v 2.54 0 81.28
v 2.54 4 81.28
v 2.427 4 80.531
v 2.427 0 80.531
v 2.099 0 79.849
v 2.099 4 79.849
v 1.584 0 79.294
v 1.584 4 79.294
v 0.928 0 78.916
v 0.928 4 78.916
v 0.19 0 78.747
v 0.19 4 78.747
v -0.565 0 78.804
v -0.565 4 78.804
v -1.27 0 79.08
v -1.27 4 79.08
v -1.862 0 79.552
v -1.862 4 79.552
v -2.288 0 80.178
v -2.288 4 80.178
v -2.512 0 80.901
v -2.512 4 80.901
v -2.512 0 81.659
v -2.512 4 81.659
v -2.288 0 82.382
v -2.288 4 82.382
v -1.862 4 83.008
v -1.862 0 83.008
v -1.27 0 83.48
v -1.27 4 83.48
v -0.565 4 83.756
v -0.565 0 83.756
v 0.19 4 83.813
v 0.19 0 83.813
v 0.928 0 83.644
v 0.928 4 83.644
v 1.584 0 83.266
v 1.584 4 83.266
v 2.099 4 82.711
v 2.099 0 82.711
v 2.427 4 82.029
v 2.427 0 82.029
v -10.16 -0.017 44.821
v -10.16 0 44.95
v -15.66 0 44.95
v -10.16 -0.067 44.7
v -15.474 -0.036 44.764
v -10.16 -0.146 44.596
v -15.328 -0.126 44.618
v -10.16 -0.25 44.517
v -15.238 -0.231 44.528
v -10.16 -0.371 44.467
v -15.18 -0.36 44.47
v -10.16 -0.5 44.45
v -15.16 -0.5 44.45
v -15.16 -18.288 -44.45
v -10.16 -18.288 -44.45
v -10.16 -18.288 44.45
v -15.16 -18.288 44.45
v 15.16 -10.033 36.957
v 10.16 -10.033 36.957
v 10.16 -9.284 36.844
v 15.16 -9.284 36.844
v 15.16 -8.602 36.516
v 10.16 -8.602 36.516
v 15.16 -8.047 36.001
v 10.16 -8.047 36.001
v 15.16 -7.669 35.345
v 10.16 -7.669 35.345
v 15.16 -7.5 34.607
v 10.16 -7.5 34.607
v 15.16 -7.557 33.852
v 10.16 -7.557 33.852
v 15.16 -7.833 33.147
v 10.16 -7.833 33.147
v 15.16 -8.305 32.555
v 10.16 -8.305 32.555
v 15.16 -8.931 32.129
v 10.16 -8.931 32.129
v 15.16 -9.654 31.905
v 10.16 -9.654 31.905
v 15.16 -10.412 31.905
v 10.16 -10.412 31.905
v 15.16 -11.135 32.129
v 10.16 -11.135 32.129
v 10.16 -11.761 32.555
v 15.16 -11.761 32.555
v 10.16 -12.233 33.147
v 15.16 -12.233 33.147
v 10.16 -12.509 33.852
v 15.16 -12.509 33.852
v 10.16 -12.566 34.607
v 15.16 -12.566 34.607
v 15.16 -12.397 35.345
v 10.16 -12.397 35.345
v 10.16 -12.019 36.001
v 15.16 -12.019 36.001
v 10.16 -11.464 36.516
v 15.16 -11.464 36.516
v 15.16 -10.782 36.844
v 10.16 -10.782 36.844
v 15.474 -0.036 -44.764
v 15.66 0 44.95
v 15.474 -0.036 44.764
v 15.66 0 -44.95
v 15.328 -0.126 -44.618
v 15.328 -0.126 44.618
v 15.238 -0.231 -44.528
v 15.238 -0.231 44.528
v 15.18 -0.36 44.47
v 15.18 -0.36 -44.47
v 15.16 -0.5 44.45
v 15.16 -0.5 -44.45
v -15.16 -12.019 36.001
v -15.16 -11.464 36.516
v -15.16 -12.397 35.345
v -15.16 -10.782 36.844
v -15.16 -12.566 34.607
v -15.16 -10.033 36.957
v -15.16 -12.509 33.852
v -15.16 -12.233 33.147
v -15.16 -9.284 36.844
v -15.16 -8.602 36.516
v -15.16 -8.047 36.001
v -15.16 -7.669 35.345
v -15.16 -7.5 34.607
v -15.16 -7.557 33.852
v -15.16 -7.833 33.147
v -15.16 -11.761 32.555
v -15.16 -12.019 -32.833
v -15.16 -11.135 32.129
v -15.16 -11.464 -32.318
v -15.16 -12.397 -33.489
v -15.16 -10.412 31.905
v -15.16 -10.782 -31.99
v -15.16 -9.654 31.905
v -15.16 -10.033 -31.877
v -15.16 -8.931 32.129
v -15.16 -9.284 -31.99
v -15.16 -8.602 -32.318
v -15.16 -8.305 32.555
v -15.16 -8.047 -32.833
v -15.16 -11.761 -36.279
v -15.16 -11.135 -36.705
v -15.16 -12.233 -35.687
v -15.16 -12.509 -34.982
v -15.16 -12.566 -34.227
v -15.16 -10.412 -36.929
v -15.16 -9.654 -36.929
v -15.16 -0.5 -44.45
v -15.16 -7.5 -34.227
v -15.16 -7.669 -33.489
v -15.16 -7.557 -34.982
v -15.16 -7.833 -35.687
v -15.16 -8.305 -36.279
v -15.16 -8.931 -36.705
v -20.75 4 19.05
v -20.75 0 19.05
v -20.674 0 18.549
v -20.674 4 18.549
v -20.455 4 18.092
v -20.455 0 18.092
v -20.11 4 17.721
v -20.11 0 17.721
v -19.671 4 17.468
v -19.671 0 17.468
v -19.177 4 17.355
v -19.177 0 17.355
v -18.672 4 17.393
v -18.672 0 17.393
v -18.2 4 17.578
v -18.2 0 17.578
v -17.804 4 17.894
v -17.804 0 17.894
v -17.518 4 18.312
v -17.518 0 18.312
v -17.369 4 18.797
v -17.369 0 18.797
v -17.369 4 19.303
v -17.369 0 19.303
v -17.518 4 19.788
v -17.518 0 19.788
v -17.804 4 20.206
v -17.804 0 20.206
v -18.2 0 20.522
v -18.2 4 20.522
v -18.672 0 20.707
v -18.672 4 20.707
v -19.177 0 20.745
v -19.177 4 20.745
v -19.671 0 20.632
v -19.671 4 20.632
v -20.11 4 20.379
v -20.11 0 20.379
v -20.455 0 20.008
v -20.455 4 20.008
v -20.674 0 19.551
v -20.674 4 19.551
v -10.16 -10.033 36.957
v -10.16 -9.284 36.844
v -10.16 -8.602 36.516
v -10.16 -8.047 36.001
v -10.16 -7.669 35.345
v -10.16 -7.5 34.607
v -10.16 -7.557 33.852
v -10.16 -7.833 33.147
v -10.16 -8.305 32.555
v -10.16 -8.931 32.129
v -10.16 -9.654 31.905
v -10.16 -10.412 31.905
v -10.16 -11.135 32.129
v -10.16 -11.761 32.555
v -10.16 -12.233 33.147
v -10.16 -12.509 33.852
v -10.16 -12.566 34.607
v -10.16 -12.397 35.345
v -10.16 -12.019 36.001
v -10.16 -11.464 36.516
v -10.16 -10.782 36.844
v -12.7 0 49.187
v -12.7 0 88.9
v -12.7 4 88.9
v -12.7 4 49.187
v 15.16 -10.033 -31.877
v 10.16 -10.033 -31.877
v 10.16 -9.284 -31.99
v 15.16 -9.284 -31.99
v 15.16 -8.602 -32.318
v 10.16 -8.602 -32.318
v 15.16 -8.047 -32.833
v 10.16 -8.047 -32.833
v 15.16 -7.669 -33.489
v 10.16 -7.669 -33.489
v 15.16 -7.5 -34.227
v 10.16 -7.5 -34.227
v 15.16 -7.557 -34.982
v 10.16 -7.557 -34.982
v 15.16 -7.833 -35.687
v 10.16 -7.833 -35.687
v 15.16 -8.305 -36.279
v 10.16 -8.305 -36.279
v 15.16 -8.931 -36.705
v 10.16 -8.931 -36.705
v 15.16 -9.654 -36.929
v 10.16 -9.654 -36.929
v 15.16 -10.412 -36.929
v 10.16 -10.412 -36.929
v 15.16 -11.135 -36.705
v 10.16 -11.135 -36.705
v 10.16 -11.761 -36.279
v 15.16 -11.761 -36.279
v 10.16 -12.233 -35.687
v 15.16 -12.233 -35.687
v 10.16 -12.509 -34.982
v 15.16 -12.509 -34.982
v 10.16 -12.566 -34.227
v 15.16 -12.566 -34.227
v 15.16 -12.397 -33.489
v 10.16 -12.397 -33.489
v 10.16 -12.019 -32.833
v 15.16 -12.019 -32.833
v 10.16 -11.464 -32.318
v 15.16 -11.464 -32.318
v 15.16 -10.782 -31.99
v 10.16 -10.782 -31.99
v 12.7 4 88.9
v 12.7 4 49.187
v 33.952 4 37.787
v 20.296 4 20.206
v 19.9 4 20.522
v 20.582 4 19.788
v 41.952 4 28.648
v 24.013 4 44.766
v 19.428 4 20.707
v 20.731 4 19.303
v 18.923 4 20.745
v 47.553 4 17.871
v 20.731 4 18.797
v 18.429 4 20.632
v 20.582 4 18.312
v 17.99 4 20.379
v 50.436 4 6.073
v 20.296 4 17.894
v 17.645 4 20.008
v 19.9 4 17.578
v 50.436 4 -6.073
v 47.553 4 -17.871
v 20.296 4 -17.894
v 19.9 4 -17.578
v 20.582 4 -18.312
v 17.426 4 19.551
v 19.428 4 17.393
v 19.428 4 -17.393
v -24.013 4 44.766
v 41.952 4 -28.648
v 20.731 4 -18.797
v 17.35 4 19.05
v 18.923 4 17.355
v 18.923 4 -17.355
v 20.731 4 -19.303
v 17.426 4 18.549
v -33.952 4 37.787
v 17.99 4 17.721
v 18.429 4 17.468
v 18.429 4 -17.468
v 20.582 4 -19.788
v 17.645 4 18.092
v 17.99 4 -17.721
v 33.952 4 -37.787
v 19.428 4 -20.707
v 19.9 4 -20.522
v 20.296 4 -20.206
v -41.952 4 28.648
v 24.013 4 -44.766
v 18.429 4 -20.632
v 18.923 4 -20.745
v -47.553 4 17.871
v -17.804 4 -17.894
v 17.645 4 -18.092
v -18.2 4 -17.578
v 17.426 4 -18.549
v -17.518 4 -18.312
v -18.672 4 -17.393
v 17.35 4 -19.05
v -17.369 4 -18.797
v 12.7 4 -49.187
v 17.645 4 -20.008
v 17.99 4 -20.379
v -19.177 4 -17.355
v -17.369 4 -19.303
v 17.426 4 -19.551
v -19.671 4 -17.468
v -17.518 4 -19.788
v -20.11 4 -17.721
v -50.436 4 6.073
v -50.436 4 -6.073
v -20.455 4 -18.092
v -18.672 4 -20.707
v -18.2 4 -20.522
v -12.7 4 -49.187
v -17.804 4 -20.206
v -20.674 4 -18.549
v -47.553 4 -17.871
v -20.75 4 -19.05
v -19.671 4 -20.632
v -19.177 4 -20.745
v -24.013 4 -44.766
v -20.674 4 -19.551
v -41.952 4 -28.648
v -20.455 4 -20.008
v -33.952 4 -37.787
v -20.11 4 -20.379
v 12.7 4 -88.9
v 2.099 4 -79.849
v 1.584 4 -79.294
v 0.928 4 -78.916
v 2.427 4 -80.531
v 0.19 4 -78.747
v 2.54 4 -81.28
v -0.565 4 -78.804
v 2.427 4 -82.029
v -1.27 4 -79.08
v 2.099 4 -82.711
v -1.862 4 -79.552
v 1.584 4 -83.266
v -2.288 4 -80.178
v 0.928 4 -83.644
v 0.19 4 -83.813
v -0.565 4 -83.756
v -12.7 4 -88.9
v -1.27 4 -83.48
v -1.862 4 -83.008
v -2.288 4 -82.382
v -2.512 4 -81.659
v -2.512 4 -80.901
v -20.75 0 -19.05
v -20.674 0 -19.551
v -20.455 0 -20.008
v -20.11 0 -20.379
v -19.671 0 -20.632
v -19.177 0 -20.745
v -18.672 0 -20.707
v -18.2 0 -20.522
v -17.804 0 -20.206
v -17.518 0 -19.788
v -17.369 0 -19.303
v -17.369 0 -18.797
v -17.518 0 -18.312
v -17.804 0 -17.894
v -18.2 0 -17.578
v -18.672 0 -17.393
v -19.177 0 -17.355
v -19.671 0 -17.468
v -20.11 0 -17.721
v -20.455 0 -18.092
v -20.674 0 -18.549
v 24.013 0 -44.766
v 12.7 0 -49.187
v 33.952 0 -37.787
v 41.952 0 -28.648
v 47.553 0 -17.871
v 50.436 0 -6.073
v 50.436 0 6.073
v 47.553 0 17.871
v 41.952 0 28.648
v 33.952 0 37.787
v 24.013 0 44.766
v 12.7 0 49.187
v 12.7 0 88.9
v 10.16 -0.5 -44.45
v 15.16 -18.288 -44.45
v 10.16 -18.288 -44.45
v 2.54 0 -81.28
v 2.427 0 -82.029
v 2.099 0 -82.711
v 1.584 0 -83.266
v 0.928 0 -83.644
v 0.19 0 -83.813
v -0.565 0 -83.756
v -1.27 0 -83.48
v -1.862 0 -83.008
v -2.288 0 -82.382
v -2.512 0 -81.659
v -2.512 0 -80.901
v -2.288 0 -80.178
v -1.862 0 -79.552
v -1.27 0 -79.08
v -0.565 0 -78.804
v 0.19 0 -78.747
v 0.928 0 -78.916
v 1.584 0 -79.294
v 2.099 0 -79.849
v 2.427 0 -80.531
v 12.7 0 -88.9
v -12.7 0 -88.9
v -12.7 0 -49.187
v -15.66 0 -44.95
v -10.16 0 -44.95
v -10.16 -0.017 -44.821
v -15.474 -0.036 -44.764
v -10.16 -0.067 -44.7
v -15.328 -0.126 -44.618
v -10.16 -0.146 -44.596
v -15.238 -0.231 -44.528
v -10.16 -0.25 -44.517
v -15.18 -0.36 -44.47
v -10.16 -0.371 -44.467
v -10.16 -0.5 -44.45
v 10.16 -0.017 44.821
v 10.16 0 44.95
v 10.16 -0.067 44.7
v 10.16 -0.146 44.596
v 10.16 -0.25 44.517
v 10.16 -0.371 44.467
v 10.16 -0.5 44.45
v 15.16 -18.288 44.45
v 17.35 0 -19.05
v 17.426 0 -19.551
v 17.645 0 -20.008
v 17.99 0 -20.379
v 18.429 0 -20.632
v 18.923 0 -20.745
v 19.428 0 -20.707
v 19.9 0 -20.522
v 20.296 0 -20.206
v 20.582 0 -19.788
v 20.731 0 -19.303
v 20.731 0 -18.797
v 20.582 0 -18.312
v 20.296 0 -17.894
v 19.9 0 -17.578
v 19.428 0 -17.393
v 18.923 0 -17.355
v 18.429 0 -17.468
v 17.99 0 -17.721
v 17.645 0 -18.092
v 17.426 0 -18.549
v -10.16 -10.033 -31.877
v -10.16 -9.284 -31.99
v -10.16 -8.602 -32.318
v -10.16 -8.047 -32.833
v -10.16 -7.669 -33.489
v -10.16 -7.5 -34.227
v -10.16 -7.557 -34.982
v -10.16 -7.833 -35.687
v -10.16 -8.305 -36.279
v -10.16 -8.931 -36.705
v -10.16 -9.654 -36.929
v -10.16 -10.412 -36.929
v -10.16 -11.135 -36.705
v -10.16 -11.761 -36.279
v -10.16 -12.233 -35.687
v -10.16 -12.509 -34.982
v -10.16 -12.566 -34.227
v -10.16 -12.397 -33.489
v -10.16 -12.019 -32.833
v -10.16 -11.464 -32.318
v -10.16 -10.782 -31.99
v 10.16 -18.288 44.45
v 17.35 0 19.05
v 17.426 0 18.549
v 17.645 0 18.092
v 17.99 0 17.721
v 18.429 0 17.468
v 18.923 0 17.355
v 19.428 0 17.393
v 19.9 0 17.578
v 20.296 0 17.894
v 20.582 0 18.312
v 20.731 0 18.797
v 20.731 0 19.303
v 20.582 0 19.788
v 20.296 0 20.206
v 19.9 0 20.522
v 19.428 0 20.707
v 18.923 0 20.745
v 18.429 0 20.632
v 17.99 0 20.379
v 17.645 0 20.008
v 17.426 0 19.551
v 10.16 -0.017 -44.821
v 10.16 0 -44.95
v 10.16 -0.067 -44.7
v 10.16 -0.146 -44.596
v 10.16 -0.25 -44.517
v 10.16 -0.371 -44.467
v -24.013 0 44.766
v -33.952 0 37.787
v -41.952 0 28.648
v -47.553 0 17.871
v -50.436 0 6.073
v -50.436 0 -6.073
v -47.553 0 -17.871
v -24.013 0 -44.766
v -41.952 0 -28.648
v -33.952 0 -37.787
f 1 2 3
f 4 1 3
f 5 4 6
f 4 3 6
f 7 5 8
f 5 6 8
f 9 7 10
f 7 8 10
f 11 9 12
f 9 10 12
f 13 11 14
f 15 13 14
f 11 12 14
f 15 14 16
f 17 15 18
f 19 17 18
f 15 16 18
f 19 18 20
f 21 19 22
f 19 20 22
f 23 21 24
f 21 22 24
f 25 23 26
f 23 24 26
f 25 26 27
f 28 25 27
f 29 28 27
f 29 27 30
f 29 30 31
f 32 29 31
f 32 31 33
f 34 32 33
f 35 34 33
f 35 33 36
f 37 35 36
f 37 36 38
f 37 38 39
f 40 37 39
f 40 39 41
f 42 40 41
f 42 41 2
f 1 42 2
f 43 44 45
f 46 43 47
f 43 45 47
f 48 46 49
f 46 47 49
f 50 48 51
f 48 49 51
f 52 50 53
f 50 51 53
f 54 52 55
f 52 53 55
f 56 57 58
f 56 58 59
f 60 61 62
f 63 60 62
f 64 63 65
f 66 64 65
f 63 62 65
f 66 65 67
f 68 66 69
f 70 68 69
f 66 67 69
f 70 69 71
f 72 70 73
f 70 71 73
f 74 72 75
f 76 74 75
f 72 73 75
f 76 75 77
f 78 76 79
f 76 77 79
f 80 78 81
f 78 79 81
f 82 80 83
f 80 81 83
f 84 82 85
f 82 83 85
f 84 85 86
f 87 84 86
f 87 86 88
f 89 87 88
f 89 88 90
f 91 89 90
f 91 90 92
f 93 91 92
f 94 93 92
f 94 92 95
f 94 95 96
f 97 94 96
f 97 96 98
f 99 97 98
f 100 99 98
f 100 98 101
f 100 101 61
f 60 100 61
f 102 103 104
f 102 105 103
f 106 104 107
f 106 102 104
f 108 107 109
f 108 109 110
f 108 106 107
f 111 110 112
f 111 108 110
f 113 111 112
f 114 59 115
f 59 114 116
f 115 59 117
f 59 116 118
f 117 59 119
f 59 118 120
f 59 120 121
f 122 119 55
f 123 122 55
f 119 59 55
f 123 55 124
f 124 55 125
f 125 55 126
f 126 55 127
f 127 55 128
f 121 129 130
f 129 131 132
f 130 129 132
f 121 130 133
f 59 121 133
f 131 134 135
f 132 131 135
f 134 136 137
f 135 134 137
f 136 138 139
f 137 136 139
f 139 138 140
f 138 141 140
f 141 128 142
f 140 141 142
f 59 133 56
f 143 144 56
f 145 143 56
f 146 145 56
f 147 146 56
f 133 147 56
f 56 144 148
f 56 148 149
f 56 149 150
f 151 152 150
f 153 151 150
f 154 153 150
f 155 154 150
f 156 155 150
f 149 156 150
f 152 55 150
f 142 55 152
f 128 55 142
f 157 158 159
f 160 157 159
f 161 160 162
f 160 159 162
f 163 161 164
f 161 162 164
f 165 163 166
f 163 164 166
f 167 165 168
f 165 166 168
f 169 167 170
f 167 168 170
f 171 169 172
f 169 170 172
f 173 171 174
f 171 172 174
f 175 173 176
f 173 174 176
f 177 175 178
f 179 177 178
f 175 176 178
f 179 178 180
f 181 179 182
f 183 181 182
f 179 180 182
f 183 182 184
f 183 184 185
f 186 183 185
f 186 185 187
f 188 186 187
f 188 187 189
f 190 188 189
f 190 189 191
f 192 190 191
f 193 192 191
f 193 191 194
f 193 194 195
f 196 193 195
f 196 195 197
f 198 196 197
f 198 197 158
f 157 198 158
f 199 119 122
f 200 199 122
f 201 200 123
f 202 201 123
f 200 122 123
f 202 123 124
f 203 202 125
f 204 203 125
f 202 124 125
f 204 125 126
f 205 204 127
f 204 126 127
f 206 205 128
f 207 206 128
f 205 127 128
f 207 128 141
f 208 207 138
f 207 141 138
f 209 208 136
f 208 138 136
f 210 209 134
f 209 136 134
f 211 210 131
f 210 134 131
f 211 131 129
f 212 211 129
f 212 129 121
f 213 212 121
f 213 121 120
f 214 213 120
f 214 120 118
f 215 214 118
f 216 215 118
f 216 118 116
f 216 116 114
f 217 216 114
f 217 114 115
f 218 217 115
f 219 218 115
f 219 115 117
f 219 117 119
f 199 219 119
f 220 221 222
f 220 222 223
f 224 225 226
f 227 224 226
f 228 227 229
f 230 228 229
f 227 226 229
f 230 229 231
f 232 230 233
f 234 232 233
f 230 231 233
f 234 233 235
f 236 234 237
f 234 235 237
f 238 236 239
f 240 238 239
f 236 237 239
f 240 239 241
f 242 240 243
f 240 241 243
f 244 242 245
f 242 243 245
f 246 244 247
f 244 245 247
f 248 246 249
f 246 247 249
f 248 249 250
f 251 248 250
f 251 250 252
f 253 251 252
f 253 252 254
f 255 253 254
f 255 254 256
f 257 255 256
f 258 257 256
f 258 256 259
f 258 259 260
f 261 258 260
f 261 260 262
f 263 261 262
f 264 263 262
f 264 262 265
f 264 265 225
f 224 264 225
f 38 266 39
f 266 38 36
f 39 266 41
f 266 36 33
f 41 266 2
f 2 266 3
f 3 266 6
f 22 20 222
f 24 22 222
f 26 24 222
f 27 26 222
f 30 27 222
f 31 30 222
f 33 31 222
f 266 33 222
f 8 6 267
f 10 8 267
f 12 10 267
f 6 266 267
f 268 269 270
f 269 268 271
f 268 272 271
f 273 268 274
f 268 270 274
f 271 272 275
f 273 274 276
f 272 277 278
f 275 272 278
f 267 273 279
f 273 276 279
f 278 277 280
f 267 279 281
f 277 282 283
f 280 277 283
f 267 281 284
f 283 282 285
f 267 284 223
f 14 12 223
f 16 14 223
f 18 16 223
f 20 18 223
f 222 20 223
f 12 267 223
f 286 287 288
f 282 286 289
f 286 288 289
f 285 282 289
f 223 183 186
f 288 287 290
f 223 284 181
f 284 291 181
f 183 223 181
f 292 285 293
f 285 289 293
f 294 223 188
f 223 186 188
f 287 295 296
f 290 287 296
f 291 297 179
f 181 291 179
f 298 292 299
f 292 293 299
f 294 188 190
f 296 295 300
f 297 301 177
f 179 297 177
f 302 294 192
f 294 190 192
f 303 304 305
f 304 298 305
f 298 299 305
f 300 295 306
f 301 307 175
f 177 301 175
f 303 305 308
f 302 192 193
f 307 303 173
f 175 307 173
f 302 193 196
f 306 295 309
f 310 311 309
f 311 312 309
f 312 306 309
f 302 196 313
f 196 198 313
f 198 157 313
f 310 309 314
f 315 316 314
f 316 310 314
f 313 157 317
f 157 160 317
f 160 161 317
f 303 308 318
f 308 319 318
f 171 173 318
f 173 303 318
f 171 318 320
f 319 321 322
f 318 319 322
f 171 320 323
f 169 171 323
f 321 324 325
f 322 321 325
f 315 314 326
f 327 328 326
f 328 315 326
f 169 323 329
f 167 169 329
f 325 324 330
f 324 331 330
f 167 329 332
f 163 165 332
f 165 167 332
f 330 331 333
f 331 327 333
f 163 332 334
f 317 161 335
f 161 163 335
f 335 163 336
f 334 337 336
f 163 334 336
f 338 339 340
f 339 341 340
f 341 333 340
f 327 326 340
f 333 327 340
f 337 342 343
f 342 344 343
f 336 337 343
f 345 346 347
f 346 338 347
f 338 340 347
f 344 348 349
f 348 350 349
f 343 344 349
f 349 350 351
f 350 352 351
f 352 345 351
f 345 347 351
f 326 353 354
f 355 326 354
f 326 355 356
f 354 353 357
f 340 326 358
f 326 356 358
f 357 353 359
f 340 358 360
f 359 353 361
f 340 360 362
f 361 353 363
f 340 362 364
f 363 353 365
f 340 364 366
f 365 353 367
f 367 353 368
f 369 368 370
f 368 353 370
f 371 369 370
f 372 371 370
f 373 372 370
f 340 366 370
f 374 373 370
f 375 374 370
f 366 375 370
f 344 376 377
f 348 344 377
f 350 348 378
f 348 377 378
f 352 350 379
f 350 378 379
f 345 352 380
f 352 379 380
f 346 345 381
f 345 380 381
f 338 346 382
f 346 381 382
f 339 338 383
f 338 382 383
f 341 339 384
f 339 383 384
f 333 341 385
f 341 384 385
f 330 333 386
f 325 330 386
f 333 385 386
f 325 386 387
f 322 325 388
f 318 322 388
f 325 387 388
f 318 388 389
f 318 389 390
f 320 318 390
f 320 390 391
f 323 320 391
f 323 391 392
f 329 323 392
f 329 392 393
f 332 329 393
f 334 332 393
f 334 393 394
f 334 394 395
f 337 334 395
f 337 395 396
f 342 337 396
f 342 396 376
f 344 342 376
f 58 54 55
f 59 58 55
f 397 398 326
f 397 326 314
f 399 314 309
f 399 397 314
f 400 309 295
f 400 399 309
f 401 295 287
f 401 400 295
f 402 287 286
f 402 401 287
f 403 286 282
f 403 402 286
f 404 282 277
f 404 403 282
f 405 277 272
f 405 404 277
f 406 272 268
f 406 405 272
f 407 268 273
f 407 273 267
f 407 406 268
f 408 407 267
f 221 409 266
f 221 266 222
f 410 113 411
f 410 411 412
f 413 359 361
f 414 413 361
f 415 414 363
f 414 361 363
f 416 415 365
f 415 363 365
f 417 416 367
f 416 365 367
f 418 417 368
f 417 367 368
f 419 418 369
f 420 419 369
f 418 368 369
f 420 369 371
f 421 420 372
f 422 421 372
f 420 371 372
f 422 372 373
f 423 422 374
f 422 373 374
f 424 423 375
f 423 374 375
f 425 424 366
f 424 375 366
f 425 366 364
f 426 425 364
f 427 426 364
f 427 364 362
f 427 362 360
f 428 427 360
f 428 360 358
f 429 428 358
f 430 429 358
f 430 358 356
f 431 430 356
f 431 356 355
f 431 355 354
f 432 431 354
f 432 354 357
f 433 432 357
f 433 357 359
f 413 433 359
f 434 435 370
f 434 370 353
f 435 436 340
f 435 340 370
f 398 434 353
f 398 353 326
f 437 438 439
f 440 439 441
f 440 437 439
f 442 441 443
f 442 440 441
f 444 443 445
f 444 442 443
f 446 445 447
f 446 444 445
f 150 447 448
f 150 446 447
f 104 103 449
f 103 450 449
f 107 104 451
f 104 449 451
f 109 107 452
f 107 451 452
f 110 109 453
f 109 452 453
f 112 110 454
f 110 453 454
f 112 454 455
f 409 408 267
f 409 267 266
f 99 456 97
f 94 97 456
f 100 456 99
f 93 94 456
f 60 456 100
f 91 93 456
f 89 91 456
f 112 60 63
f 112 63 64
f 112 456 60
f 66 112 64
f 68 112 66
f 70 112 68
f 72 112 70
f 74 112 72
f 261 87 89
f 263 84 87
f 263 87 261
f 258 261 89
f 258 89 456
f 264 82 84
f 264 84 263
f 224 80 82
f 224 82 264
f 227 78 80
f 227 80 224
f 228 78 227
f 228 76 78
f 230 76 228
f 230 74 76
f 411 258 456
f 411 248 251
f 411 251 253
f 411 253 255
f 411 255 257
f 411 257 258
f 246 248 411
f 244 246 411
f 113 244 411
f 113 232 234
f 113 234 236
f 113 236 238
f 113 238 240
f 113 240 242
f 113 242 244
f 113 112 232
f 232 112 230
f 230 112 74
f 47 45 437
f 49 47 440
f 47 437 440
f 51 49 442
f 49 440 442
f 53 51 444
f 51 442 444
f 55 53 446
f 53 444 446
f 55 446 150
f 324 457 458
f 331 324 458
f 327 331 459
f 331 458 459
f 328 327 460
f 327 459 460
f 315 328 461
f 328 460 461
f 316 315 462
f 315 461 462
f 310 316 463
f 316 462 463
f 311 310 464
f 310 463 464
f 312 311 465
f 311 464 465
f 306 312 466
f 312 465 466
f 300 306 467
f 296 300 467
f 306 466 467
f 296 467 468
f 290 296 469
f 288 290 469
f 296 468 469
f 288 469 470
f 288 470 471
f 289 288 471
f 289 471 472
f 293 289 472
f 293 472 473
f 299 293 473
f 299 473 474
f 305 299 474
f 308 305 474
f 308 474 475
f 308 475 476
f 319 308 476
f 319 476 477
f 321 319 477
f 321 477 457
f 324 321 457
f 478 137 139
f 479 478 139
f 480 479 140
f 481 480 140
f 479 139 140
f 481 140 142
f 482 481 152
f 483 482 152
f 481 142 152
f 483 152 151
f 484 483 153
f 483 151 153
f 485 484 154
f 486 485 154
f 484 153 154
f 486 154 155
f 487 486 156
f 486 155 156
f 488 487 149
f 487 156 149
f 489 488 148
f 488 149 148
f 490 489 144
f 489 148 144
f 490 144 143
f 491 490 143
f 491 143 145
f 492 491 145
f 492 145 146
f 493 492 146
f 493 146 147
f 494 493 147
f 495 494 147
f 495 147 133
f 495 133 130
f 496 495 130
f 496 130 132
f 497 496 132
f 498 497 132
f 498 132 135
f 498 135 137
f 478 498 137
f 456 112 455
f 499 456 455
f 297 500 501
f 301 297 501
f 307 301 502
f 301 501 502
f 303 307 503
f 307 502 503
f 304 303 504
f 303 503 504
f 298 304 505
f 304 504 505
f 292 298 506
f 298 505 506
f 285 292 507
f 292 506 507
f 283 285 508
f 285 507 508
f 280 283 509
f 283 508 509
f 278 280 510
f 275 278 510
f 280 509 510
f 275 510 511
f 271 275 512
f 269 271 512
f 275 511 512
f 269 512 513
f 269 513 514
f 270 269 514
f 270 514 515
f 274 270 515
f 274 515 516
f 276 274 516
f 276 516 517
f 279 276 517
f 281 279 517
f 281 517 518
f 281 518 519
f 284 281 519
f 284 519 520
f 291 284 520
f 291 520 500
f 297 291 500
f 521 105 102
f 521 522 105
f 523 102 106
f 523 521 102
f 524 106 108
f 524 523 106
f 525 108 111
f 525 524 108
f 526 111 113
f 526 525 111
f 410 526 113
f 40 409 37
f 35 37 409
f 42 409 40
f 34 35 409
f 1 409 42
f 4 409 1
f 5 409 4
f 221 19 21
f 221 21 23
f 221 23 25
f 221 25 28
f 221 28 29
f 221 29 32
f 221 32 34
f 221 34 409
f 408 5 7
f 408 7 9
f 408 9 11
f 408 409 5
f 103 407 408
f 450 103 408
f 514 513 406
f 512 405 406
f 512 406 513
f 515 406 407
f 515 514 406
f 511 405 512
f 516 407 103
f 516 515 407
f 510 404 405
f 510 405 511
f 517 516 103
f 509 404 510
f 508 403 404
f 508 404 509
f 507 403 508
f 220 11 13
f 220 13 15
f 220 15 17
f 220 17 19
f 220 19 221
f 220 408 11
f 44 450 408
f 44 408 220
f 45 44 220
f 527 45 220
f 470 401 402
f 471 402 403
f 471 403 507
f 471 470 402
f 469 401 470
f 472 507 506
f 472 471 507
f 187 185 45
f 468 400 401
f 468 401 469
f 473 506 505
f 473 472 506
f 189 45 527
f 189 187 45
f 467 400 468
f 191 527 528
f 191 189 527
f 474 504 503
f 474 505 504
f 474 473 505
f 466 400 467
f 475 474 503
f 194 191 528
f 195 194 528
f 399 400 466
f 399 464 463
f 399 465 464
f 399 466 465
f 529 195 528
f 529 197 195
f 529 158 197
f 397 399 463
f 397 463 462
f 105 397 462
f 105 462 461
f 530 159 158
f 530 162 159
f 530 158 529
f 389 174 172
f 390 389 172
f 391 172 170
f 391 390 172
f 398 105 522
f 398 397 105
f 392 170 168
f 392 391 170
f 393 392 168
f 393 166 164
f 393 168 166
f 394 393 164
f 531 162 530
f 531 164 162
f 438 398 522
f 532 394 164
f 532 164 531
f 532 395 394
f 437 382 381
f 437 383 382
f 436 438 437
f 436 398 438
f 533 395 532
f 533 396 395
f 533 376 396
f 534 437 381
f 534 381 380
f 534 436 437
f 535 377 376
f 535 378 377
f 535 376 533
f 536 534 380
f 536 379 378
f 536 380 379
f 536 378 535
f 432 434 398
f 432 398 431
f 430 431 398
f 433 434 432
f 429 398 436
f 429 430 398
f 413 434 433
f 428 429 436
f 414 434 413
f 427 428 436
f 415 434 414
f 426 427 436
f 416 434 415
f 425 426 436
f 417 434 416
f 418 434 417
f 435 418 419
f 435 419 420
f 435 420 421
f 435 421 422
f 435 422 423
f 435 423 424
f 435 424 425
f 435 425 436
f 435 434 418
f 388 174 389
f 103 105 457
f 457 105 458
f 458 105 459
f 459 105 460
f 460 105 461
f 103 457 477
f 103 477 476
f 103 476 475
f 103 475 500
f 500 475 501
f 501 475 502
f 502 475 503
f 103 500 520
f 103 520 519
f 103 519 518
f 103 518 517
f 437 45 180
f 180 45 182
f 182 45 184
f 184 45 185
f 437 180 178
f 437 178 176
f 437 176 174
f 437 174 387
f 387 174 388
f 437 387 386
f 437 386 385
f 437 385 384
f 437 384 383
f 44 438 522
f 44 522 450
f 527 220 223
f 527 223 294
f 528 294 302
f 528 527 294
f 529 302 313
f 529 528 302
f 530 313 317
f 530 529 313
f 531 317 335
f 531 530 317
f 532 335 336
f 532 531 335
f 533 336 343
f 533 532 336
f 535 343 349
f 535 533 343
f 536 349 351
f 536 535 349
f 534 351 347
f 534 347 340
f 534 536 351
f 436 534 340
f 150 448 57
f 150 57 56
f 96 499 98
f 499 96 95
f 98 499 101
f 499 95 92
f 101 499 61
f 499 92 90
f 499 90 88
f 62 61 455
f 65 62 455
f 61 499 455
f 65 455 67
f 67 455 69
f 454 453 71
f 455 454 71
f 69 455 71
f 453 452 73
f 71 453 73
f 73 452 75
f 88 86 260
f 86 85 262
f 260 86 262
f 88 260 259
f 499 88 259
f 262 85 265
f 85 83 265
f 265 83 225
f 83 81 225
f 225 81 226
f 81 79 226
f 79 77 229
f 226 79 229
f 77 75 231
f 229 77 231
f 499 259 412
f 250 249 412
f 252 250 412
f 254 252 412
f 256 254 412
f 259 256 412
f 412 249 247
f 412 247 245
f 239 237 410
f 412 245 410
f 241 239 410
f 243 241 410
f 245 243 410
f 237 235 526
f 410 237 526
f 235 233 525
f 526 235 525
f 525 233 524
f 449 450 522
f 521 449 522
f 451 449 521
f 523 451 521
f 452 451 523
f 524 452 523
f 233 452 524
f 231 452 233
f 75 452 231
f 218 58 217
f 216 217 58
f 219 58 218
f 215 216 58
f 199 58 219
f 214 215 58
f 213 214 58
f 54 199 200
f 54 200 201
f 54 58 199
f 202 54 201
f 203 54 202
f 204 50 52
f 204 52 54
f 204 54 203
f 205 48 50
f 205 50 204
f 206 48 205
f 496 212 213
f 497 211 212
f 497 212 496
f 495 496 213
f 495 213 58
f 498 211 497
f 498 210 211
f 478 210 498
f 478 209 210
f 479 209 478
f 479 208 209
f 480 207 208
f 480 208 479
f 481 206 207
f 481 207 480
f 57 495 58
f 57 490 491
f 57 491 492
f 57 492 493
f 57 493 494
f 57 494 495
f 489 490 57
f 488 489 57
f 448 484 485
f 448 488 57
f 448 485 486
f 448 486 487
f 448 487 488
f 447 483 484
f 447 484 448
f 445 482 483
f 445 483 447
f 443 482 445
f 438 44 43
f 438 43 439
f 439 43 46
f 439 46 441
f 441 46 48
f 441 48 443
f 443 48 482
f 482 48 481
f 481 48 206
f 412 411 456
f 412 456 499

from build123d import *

# Parameters (mm, degrees)
BOSS_EXTRUDE1_DEPTH  = 4
SKETCH3_W            = 5
SKETCH3_H            = 88.9
BOSS_EXTRUDE2_DEPTH  = 18.288
M3_CLEARANCE_HOLE1_D = 3.4
FILLET1_R            = 0.5
SKETCH6_R            = 2.54
CUT_EXTRUDE1_DEPTH   = 66.96
SKETCH7_R            = 2.54
CUT_EXTRUDE2_DEPTH   = 23.288


with BuildPart() as part:
    # Sketch1 → Boss-Extrude1 (new body)
    with BuildSketch(Plane(origin=(0, 0, 0), x_dir=(1, 0, 0), z_dir=(0, 1, 0))):
        with BuildLine():
            Line((-12.7, 49.186888497), (-12.7, 88.9))
            Line((-12.7, 88.9), (12.7, 88.9))
            Line((12.7, 88.9), (12.7, 49.186888497))
            ThreePointArc((12.7, 49.186888497), (50.8, 0), (12.7, -49.186888497))
            Line((12.7, -49.186888497), (12.7, -88.9))
            Line((12.7, -88.9), (-12.7, -88.9))
            Line((-12.7, -88.9), (-12.7, -49.186888497))
            ThreePointArc((-12.7, -49.186888497), (-50.8, 0), (-12.7, 49.186888497))
        make_face()
    extrude(amount=BOSS_EXTRUDE1_DEPTH)

    # Sketch3 → Boss-Extrude2 (add)
    with BuildSketch(Plane(origin=(0, 0, 0), x_dir=(-1, 0, 0), z_dir=(0, -1, 0))):
        with Locations((12.66, 0)):
            Rectangle(SKETCH3_W, SKETCH3_H)
        with Locations((-12.66, 0)):
            Rectangle(SKETCH3_W, SKETCH3_H)
    extrude(amount=BOSS_EXTRUDE2_DEPTH)

    # M3 Clearance Hole1 (through all)
    with Locations(Plane(origin=(0, 4, 0), x_dir=(1, 0, 0), z_dir=(0, 1, 0))):
        with Locations((-19.05, -19.05), (19.05, -19.05), (-19.05, 19.05), (19.05, 19.05)):
            Hole(M3_CLEARANCE_HOLE1_D / 2)

    # Fillet1
    fillet1_edges = [part.edges().sort_by_distance(p)[0] for p in [
        (-15.16, 0, 0),
        (-12.66, 0, -44.45),
        (-12.66, 0, 44.45),
        (12.66, 0, -44.45),
        (15.16, 0, 0),
        (12.66, 0, 44.45),
    ]]
    fillet(fillet1_edges, radius=FILLET1_R)

    # Sketch6 → Cut-Extrude1 (cut, through all)
    with BuildSketch(Plane.ZY.offset(15.16)):
        with Locations((34.417, -10.033)):
            Circle(SKETCH6_R)
        with Locations((-34.417, -10.033)):
            Circle(SKETCH6_R)
    extrude(amount=-CUT_EXTRUDE1_DEPTH, mode=Mode.SUBTRACT)

    # Sketch7 → Cut-Extrude2 (cut, through all)
    with BuildSketch(Plane(origin=(0, 4, 0), x_dir=(1, 0, 0), z_dir=(0, 1, 0))):
        with Locations((0, 81.28)):
            Circle(SKETCH7_R)
        with Locations((0, -81.28)):
            Circle(SKETCH7_R)
    extrude(amount=-CUT_EXTRUDE2_DEPTH, mode=Mode.SUBTRACT)


solid = part.part
